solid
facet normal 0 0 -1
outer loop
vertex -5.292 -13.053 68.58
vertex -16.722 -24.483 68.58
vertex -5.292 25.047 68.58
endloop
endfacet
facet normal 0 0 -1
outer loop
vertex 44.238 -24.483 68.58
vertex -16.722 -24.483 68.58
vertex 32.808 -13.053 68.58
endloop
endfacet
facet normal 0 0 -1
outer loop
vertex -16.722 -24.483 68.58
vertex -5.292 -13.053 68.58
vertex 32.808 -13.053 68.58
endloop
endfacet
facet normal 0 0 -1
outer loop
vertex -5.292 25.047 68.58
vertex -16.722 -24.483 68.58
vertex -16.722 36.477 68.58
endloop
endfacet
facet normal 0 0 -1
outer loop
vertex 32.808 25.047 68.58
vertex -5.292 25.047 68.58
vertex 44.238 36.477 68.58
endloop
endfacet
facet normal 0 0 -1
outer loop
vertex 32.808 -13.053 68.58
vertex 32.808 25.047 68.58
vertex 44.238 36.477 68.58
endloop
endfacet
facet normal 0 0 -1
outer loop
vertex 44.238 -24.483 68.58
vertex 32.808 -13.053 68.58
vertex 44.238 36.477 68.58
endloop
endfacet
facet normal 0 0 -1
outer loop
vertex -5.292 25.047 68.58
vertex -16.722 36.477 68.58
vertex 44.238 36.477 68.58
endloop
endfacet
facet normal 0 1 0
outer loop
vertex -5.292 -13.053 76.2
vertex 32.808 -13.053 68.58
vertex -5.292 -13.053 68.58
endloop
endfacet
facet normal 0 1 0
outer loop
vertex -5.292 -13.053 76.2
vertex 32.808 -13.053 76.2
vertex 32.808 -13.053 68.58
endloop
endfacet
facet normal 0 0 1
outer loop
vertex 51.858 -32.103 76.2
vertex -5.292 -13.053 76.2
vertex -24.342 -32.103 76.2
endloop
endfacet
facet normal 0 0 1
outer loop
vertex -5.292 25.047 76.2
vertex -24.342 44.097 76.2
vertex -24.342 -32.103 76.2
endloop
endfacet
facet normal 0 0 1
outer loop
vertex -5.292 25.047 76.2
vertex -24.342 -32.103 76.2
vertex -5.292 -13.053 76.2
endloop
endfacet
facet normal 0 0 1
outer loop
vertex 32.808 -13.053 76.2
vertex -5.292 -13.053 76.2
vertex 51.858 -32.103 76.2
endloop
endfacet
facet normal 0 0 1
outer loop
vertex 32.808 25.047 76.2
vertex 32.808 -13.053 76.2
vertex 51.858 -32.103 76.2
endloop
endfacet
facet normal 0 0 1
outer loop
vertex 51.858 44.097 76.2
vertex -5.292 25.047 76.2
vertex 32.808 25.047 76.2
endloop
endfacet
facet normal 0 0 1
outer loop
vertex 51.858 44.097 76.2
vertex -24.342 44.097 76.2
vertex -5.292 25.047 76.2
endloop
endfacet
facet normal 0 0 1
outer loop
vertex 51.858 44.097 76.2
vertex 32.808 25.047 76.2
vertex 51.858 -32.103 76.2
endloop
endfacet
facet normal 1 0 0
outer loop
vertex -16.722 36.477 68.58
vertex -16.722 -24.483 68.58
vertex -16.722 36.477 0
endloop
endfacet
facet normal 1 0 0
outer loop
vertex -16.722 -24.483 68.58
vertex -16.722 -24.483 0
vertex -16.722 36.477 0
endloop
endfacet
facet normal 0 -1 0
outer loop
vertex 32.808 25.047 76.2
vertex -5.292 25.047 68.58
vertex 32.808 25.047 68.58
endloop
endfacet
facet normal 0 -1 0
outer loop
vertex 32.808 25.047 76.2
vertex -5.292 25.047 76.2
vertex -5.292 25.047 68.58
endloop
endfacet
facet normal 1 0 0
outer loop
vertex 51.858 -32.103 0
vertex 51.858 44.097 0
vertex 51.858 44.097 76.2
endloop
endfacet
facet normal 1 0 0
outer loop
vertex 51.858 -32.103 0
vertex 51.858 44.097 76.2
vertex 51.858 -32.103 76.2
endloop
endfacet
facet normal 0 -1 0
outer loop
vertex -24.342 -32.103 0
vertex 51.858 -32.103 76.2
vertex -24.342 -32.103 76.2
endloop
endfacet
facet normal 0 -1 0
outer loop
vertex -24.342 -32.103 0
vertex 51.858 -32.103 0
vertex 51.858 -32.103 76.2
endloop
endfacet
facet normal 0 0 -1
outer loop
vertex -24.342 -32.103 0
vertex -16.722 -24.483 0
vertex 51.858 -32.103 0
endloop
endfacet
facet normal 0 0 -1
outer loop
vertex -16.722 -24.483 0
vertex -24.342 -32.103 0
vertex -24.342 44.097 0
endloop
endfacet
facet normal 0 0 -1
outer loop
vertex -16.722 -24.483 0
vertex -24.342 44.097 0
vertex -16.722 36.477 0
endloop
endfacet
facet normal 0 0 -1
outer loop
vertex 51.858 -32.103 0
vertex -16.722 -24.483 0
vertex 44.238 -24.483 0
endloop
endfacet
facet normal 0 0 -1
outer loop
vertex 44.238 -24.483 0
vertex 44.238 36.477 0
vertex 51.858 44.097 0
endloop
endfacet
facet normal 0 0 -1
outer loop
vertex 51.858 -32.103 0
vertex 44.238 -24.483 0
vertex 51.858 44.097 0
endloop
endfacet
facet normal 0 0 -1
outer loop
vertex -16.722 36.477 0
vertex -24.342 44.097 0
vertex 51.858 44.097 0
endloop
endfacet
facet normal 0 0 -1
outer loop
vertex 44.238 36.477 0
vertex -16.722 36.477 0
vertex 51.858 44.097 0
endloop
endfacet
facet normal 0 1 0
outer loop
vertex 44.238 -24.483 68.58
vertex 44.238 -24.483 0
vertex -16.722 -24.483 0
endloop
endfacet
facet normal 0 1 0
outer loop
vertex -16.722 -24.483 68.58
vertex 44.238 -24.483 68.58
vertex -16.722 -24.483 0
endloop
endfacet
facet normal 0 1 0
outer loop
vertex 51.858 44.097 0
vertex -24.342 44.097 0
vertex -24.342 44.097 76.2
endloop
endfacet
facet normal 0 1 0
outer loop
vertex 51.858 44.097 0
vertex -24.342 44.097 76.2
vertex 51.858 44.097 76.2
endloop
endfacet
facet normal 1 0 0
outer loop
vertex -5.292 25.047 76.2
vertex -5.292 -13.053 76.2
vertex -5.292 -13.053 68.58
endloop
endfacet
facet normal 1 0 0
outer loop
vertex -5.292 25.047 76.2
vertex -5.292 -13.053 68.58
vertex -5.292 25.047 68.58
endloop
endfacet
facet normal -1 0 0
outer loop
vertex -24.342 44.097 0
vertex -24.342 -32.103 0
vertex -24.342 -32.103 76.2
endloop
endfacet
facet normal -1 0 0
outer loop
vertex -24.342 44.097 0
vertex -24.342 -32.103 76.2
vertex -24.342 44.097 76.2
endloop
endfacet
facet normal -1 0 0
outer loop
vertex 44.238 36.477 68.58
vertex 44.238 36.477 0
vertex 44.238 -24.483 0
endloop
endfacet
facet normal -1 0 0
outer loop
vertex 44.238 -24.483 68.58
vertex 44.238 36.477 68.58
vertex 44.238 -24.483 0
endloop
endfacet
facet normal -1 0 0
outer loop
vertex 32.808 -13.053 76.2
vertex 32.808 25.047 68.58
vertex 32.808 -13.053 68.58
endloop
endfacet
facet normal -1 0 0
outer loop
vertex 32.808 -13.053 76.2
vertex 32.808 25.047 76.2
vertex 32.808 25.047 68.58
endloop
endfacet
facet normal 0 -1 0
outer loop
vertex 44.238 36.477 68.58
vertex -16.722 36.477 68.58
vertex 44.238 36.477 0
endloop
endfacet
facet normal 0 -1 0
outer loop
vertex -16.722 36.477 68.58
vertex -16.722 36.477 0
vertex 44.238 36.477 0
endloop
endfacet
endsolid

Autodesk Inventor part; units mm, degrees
ref_plane "YZ Plane" through (0, 0, 0) normal (1, 0, 0) x (0, 1, 0)
ref_plane "XZ Plane" through (0, 0, 0) normal (0, 1, 0) x (-1, 0, 0)
ref_plane "XY Plane" through (0, 0, 0) normal (0, 0, 1) x (1, 0, 0)
sketch "Sketch1" plane through (0, 0, 0) normal (0, 0, 1) x (1, 0, 0)
  line L0 (-24.3417, 44.0972) -> (51.8583, 44.0972)
  line L1 (51.8583, 44.0972) -> (51.8583, -32.1028)
  line L2 (51.8583, -32.1028) -> (-24.3417, -32.1028)
  line L3 (-24.3417, -32.1028) -> (-24.3417, 44.0972)
  point P0 (0, 0)
  dimension "d0" = 76.2
  dimension "d1" = 76.2
extrude "Extrusion1" add sketch "Sketch1" along normal blind 76.2
shell "Shell1" thickness 7.62 removed faces 1 at (1.0583, 18.6972, 0)
sketch "Sketch2" plane through (0, 0, 76.2) normal (0, 0, 1) x (1, 0, 0)
  line L0 (-5.2917, 25.0472) -> (32.8083, 25.0472)
  line L1 (32.8083, 25.0472) -> (32.8083, -13.0528)
  line L2 (32.8083, -13.0528) -> (-5.2917, -13.0528)
  line L3 (-5.2917, -13.0528) -> (-5.2917, 25.0472)
  line L4 (51.8583, 44.0972) -> (-24.3417, 44.0972) projected
  line L5 (51.8583, -32.1028) -> (51.8583, 44.0972) projected
  point P0 (0, 0)
  dimension "d5" = 38.1
  dimension "d6" = 38.1
  dimension "d7" = 19.05
  dimension "d8" = 19.05
extrude "Extrusion2" cut sketch "Sketch2" against normal blind 25.4
properties part number "secondary_part"
